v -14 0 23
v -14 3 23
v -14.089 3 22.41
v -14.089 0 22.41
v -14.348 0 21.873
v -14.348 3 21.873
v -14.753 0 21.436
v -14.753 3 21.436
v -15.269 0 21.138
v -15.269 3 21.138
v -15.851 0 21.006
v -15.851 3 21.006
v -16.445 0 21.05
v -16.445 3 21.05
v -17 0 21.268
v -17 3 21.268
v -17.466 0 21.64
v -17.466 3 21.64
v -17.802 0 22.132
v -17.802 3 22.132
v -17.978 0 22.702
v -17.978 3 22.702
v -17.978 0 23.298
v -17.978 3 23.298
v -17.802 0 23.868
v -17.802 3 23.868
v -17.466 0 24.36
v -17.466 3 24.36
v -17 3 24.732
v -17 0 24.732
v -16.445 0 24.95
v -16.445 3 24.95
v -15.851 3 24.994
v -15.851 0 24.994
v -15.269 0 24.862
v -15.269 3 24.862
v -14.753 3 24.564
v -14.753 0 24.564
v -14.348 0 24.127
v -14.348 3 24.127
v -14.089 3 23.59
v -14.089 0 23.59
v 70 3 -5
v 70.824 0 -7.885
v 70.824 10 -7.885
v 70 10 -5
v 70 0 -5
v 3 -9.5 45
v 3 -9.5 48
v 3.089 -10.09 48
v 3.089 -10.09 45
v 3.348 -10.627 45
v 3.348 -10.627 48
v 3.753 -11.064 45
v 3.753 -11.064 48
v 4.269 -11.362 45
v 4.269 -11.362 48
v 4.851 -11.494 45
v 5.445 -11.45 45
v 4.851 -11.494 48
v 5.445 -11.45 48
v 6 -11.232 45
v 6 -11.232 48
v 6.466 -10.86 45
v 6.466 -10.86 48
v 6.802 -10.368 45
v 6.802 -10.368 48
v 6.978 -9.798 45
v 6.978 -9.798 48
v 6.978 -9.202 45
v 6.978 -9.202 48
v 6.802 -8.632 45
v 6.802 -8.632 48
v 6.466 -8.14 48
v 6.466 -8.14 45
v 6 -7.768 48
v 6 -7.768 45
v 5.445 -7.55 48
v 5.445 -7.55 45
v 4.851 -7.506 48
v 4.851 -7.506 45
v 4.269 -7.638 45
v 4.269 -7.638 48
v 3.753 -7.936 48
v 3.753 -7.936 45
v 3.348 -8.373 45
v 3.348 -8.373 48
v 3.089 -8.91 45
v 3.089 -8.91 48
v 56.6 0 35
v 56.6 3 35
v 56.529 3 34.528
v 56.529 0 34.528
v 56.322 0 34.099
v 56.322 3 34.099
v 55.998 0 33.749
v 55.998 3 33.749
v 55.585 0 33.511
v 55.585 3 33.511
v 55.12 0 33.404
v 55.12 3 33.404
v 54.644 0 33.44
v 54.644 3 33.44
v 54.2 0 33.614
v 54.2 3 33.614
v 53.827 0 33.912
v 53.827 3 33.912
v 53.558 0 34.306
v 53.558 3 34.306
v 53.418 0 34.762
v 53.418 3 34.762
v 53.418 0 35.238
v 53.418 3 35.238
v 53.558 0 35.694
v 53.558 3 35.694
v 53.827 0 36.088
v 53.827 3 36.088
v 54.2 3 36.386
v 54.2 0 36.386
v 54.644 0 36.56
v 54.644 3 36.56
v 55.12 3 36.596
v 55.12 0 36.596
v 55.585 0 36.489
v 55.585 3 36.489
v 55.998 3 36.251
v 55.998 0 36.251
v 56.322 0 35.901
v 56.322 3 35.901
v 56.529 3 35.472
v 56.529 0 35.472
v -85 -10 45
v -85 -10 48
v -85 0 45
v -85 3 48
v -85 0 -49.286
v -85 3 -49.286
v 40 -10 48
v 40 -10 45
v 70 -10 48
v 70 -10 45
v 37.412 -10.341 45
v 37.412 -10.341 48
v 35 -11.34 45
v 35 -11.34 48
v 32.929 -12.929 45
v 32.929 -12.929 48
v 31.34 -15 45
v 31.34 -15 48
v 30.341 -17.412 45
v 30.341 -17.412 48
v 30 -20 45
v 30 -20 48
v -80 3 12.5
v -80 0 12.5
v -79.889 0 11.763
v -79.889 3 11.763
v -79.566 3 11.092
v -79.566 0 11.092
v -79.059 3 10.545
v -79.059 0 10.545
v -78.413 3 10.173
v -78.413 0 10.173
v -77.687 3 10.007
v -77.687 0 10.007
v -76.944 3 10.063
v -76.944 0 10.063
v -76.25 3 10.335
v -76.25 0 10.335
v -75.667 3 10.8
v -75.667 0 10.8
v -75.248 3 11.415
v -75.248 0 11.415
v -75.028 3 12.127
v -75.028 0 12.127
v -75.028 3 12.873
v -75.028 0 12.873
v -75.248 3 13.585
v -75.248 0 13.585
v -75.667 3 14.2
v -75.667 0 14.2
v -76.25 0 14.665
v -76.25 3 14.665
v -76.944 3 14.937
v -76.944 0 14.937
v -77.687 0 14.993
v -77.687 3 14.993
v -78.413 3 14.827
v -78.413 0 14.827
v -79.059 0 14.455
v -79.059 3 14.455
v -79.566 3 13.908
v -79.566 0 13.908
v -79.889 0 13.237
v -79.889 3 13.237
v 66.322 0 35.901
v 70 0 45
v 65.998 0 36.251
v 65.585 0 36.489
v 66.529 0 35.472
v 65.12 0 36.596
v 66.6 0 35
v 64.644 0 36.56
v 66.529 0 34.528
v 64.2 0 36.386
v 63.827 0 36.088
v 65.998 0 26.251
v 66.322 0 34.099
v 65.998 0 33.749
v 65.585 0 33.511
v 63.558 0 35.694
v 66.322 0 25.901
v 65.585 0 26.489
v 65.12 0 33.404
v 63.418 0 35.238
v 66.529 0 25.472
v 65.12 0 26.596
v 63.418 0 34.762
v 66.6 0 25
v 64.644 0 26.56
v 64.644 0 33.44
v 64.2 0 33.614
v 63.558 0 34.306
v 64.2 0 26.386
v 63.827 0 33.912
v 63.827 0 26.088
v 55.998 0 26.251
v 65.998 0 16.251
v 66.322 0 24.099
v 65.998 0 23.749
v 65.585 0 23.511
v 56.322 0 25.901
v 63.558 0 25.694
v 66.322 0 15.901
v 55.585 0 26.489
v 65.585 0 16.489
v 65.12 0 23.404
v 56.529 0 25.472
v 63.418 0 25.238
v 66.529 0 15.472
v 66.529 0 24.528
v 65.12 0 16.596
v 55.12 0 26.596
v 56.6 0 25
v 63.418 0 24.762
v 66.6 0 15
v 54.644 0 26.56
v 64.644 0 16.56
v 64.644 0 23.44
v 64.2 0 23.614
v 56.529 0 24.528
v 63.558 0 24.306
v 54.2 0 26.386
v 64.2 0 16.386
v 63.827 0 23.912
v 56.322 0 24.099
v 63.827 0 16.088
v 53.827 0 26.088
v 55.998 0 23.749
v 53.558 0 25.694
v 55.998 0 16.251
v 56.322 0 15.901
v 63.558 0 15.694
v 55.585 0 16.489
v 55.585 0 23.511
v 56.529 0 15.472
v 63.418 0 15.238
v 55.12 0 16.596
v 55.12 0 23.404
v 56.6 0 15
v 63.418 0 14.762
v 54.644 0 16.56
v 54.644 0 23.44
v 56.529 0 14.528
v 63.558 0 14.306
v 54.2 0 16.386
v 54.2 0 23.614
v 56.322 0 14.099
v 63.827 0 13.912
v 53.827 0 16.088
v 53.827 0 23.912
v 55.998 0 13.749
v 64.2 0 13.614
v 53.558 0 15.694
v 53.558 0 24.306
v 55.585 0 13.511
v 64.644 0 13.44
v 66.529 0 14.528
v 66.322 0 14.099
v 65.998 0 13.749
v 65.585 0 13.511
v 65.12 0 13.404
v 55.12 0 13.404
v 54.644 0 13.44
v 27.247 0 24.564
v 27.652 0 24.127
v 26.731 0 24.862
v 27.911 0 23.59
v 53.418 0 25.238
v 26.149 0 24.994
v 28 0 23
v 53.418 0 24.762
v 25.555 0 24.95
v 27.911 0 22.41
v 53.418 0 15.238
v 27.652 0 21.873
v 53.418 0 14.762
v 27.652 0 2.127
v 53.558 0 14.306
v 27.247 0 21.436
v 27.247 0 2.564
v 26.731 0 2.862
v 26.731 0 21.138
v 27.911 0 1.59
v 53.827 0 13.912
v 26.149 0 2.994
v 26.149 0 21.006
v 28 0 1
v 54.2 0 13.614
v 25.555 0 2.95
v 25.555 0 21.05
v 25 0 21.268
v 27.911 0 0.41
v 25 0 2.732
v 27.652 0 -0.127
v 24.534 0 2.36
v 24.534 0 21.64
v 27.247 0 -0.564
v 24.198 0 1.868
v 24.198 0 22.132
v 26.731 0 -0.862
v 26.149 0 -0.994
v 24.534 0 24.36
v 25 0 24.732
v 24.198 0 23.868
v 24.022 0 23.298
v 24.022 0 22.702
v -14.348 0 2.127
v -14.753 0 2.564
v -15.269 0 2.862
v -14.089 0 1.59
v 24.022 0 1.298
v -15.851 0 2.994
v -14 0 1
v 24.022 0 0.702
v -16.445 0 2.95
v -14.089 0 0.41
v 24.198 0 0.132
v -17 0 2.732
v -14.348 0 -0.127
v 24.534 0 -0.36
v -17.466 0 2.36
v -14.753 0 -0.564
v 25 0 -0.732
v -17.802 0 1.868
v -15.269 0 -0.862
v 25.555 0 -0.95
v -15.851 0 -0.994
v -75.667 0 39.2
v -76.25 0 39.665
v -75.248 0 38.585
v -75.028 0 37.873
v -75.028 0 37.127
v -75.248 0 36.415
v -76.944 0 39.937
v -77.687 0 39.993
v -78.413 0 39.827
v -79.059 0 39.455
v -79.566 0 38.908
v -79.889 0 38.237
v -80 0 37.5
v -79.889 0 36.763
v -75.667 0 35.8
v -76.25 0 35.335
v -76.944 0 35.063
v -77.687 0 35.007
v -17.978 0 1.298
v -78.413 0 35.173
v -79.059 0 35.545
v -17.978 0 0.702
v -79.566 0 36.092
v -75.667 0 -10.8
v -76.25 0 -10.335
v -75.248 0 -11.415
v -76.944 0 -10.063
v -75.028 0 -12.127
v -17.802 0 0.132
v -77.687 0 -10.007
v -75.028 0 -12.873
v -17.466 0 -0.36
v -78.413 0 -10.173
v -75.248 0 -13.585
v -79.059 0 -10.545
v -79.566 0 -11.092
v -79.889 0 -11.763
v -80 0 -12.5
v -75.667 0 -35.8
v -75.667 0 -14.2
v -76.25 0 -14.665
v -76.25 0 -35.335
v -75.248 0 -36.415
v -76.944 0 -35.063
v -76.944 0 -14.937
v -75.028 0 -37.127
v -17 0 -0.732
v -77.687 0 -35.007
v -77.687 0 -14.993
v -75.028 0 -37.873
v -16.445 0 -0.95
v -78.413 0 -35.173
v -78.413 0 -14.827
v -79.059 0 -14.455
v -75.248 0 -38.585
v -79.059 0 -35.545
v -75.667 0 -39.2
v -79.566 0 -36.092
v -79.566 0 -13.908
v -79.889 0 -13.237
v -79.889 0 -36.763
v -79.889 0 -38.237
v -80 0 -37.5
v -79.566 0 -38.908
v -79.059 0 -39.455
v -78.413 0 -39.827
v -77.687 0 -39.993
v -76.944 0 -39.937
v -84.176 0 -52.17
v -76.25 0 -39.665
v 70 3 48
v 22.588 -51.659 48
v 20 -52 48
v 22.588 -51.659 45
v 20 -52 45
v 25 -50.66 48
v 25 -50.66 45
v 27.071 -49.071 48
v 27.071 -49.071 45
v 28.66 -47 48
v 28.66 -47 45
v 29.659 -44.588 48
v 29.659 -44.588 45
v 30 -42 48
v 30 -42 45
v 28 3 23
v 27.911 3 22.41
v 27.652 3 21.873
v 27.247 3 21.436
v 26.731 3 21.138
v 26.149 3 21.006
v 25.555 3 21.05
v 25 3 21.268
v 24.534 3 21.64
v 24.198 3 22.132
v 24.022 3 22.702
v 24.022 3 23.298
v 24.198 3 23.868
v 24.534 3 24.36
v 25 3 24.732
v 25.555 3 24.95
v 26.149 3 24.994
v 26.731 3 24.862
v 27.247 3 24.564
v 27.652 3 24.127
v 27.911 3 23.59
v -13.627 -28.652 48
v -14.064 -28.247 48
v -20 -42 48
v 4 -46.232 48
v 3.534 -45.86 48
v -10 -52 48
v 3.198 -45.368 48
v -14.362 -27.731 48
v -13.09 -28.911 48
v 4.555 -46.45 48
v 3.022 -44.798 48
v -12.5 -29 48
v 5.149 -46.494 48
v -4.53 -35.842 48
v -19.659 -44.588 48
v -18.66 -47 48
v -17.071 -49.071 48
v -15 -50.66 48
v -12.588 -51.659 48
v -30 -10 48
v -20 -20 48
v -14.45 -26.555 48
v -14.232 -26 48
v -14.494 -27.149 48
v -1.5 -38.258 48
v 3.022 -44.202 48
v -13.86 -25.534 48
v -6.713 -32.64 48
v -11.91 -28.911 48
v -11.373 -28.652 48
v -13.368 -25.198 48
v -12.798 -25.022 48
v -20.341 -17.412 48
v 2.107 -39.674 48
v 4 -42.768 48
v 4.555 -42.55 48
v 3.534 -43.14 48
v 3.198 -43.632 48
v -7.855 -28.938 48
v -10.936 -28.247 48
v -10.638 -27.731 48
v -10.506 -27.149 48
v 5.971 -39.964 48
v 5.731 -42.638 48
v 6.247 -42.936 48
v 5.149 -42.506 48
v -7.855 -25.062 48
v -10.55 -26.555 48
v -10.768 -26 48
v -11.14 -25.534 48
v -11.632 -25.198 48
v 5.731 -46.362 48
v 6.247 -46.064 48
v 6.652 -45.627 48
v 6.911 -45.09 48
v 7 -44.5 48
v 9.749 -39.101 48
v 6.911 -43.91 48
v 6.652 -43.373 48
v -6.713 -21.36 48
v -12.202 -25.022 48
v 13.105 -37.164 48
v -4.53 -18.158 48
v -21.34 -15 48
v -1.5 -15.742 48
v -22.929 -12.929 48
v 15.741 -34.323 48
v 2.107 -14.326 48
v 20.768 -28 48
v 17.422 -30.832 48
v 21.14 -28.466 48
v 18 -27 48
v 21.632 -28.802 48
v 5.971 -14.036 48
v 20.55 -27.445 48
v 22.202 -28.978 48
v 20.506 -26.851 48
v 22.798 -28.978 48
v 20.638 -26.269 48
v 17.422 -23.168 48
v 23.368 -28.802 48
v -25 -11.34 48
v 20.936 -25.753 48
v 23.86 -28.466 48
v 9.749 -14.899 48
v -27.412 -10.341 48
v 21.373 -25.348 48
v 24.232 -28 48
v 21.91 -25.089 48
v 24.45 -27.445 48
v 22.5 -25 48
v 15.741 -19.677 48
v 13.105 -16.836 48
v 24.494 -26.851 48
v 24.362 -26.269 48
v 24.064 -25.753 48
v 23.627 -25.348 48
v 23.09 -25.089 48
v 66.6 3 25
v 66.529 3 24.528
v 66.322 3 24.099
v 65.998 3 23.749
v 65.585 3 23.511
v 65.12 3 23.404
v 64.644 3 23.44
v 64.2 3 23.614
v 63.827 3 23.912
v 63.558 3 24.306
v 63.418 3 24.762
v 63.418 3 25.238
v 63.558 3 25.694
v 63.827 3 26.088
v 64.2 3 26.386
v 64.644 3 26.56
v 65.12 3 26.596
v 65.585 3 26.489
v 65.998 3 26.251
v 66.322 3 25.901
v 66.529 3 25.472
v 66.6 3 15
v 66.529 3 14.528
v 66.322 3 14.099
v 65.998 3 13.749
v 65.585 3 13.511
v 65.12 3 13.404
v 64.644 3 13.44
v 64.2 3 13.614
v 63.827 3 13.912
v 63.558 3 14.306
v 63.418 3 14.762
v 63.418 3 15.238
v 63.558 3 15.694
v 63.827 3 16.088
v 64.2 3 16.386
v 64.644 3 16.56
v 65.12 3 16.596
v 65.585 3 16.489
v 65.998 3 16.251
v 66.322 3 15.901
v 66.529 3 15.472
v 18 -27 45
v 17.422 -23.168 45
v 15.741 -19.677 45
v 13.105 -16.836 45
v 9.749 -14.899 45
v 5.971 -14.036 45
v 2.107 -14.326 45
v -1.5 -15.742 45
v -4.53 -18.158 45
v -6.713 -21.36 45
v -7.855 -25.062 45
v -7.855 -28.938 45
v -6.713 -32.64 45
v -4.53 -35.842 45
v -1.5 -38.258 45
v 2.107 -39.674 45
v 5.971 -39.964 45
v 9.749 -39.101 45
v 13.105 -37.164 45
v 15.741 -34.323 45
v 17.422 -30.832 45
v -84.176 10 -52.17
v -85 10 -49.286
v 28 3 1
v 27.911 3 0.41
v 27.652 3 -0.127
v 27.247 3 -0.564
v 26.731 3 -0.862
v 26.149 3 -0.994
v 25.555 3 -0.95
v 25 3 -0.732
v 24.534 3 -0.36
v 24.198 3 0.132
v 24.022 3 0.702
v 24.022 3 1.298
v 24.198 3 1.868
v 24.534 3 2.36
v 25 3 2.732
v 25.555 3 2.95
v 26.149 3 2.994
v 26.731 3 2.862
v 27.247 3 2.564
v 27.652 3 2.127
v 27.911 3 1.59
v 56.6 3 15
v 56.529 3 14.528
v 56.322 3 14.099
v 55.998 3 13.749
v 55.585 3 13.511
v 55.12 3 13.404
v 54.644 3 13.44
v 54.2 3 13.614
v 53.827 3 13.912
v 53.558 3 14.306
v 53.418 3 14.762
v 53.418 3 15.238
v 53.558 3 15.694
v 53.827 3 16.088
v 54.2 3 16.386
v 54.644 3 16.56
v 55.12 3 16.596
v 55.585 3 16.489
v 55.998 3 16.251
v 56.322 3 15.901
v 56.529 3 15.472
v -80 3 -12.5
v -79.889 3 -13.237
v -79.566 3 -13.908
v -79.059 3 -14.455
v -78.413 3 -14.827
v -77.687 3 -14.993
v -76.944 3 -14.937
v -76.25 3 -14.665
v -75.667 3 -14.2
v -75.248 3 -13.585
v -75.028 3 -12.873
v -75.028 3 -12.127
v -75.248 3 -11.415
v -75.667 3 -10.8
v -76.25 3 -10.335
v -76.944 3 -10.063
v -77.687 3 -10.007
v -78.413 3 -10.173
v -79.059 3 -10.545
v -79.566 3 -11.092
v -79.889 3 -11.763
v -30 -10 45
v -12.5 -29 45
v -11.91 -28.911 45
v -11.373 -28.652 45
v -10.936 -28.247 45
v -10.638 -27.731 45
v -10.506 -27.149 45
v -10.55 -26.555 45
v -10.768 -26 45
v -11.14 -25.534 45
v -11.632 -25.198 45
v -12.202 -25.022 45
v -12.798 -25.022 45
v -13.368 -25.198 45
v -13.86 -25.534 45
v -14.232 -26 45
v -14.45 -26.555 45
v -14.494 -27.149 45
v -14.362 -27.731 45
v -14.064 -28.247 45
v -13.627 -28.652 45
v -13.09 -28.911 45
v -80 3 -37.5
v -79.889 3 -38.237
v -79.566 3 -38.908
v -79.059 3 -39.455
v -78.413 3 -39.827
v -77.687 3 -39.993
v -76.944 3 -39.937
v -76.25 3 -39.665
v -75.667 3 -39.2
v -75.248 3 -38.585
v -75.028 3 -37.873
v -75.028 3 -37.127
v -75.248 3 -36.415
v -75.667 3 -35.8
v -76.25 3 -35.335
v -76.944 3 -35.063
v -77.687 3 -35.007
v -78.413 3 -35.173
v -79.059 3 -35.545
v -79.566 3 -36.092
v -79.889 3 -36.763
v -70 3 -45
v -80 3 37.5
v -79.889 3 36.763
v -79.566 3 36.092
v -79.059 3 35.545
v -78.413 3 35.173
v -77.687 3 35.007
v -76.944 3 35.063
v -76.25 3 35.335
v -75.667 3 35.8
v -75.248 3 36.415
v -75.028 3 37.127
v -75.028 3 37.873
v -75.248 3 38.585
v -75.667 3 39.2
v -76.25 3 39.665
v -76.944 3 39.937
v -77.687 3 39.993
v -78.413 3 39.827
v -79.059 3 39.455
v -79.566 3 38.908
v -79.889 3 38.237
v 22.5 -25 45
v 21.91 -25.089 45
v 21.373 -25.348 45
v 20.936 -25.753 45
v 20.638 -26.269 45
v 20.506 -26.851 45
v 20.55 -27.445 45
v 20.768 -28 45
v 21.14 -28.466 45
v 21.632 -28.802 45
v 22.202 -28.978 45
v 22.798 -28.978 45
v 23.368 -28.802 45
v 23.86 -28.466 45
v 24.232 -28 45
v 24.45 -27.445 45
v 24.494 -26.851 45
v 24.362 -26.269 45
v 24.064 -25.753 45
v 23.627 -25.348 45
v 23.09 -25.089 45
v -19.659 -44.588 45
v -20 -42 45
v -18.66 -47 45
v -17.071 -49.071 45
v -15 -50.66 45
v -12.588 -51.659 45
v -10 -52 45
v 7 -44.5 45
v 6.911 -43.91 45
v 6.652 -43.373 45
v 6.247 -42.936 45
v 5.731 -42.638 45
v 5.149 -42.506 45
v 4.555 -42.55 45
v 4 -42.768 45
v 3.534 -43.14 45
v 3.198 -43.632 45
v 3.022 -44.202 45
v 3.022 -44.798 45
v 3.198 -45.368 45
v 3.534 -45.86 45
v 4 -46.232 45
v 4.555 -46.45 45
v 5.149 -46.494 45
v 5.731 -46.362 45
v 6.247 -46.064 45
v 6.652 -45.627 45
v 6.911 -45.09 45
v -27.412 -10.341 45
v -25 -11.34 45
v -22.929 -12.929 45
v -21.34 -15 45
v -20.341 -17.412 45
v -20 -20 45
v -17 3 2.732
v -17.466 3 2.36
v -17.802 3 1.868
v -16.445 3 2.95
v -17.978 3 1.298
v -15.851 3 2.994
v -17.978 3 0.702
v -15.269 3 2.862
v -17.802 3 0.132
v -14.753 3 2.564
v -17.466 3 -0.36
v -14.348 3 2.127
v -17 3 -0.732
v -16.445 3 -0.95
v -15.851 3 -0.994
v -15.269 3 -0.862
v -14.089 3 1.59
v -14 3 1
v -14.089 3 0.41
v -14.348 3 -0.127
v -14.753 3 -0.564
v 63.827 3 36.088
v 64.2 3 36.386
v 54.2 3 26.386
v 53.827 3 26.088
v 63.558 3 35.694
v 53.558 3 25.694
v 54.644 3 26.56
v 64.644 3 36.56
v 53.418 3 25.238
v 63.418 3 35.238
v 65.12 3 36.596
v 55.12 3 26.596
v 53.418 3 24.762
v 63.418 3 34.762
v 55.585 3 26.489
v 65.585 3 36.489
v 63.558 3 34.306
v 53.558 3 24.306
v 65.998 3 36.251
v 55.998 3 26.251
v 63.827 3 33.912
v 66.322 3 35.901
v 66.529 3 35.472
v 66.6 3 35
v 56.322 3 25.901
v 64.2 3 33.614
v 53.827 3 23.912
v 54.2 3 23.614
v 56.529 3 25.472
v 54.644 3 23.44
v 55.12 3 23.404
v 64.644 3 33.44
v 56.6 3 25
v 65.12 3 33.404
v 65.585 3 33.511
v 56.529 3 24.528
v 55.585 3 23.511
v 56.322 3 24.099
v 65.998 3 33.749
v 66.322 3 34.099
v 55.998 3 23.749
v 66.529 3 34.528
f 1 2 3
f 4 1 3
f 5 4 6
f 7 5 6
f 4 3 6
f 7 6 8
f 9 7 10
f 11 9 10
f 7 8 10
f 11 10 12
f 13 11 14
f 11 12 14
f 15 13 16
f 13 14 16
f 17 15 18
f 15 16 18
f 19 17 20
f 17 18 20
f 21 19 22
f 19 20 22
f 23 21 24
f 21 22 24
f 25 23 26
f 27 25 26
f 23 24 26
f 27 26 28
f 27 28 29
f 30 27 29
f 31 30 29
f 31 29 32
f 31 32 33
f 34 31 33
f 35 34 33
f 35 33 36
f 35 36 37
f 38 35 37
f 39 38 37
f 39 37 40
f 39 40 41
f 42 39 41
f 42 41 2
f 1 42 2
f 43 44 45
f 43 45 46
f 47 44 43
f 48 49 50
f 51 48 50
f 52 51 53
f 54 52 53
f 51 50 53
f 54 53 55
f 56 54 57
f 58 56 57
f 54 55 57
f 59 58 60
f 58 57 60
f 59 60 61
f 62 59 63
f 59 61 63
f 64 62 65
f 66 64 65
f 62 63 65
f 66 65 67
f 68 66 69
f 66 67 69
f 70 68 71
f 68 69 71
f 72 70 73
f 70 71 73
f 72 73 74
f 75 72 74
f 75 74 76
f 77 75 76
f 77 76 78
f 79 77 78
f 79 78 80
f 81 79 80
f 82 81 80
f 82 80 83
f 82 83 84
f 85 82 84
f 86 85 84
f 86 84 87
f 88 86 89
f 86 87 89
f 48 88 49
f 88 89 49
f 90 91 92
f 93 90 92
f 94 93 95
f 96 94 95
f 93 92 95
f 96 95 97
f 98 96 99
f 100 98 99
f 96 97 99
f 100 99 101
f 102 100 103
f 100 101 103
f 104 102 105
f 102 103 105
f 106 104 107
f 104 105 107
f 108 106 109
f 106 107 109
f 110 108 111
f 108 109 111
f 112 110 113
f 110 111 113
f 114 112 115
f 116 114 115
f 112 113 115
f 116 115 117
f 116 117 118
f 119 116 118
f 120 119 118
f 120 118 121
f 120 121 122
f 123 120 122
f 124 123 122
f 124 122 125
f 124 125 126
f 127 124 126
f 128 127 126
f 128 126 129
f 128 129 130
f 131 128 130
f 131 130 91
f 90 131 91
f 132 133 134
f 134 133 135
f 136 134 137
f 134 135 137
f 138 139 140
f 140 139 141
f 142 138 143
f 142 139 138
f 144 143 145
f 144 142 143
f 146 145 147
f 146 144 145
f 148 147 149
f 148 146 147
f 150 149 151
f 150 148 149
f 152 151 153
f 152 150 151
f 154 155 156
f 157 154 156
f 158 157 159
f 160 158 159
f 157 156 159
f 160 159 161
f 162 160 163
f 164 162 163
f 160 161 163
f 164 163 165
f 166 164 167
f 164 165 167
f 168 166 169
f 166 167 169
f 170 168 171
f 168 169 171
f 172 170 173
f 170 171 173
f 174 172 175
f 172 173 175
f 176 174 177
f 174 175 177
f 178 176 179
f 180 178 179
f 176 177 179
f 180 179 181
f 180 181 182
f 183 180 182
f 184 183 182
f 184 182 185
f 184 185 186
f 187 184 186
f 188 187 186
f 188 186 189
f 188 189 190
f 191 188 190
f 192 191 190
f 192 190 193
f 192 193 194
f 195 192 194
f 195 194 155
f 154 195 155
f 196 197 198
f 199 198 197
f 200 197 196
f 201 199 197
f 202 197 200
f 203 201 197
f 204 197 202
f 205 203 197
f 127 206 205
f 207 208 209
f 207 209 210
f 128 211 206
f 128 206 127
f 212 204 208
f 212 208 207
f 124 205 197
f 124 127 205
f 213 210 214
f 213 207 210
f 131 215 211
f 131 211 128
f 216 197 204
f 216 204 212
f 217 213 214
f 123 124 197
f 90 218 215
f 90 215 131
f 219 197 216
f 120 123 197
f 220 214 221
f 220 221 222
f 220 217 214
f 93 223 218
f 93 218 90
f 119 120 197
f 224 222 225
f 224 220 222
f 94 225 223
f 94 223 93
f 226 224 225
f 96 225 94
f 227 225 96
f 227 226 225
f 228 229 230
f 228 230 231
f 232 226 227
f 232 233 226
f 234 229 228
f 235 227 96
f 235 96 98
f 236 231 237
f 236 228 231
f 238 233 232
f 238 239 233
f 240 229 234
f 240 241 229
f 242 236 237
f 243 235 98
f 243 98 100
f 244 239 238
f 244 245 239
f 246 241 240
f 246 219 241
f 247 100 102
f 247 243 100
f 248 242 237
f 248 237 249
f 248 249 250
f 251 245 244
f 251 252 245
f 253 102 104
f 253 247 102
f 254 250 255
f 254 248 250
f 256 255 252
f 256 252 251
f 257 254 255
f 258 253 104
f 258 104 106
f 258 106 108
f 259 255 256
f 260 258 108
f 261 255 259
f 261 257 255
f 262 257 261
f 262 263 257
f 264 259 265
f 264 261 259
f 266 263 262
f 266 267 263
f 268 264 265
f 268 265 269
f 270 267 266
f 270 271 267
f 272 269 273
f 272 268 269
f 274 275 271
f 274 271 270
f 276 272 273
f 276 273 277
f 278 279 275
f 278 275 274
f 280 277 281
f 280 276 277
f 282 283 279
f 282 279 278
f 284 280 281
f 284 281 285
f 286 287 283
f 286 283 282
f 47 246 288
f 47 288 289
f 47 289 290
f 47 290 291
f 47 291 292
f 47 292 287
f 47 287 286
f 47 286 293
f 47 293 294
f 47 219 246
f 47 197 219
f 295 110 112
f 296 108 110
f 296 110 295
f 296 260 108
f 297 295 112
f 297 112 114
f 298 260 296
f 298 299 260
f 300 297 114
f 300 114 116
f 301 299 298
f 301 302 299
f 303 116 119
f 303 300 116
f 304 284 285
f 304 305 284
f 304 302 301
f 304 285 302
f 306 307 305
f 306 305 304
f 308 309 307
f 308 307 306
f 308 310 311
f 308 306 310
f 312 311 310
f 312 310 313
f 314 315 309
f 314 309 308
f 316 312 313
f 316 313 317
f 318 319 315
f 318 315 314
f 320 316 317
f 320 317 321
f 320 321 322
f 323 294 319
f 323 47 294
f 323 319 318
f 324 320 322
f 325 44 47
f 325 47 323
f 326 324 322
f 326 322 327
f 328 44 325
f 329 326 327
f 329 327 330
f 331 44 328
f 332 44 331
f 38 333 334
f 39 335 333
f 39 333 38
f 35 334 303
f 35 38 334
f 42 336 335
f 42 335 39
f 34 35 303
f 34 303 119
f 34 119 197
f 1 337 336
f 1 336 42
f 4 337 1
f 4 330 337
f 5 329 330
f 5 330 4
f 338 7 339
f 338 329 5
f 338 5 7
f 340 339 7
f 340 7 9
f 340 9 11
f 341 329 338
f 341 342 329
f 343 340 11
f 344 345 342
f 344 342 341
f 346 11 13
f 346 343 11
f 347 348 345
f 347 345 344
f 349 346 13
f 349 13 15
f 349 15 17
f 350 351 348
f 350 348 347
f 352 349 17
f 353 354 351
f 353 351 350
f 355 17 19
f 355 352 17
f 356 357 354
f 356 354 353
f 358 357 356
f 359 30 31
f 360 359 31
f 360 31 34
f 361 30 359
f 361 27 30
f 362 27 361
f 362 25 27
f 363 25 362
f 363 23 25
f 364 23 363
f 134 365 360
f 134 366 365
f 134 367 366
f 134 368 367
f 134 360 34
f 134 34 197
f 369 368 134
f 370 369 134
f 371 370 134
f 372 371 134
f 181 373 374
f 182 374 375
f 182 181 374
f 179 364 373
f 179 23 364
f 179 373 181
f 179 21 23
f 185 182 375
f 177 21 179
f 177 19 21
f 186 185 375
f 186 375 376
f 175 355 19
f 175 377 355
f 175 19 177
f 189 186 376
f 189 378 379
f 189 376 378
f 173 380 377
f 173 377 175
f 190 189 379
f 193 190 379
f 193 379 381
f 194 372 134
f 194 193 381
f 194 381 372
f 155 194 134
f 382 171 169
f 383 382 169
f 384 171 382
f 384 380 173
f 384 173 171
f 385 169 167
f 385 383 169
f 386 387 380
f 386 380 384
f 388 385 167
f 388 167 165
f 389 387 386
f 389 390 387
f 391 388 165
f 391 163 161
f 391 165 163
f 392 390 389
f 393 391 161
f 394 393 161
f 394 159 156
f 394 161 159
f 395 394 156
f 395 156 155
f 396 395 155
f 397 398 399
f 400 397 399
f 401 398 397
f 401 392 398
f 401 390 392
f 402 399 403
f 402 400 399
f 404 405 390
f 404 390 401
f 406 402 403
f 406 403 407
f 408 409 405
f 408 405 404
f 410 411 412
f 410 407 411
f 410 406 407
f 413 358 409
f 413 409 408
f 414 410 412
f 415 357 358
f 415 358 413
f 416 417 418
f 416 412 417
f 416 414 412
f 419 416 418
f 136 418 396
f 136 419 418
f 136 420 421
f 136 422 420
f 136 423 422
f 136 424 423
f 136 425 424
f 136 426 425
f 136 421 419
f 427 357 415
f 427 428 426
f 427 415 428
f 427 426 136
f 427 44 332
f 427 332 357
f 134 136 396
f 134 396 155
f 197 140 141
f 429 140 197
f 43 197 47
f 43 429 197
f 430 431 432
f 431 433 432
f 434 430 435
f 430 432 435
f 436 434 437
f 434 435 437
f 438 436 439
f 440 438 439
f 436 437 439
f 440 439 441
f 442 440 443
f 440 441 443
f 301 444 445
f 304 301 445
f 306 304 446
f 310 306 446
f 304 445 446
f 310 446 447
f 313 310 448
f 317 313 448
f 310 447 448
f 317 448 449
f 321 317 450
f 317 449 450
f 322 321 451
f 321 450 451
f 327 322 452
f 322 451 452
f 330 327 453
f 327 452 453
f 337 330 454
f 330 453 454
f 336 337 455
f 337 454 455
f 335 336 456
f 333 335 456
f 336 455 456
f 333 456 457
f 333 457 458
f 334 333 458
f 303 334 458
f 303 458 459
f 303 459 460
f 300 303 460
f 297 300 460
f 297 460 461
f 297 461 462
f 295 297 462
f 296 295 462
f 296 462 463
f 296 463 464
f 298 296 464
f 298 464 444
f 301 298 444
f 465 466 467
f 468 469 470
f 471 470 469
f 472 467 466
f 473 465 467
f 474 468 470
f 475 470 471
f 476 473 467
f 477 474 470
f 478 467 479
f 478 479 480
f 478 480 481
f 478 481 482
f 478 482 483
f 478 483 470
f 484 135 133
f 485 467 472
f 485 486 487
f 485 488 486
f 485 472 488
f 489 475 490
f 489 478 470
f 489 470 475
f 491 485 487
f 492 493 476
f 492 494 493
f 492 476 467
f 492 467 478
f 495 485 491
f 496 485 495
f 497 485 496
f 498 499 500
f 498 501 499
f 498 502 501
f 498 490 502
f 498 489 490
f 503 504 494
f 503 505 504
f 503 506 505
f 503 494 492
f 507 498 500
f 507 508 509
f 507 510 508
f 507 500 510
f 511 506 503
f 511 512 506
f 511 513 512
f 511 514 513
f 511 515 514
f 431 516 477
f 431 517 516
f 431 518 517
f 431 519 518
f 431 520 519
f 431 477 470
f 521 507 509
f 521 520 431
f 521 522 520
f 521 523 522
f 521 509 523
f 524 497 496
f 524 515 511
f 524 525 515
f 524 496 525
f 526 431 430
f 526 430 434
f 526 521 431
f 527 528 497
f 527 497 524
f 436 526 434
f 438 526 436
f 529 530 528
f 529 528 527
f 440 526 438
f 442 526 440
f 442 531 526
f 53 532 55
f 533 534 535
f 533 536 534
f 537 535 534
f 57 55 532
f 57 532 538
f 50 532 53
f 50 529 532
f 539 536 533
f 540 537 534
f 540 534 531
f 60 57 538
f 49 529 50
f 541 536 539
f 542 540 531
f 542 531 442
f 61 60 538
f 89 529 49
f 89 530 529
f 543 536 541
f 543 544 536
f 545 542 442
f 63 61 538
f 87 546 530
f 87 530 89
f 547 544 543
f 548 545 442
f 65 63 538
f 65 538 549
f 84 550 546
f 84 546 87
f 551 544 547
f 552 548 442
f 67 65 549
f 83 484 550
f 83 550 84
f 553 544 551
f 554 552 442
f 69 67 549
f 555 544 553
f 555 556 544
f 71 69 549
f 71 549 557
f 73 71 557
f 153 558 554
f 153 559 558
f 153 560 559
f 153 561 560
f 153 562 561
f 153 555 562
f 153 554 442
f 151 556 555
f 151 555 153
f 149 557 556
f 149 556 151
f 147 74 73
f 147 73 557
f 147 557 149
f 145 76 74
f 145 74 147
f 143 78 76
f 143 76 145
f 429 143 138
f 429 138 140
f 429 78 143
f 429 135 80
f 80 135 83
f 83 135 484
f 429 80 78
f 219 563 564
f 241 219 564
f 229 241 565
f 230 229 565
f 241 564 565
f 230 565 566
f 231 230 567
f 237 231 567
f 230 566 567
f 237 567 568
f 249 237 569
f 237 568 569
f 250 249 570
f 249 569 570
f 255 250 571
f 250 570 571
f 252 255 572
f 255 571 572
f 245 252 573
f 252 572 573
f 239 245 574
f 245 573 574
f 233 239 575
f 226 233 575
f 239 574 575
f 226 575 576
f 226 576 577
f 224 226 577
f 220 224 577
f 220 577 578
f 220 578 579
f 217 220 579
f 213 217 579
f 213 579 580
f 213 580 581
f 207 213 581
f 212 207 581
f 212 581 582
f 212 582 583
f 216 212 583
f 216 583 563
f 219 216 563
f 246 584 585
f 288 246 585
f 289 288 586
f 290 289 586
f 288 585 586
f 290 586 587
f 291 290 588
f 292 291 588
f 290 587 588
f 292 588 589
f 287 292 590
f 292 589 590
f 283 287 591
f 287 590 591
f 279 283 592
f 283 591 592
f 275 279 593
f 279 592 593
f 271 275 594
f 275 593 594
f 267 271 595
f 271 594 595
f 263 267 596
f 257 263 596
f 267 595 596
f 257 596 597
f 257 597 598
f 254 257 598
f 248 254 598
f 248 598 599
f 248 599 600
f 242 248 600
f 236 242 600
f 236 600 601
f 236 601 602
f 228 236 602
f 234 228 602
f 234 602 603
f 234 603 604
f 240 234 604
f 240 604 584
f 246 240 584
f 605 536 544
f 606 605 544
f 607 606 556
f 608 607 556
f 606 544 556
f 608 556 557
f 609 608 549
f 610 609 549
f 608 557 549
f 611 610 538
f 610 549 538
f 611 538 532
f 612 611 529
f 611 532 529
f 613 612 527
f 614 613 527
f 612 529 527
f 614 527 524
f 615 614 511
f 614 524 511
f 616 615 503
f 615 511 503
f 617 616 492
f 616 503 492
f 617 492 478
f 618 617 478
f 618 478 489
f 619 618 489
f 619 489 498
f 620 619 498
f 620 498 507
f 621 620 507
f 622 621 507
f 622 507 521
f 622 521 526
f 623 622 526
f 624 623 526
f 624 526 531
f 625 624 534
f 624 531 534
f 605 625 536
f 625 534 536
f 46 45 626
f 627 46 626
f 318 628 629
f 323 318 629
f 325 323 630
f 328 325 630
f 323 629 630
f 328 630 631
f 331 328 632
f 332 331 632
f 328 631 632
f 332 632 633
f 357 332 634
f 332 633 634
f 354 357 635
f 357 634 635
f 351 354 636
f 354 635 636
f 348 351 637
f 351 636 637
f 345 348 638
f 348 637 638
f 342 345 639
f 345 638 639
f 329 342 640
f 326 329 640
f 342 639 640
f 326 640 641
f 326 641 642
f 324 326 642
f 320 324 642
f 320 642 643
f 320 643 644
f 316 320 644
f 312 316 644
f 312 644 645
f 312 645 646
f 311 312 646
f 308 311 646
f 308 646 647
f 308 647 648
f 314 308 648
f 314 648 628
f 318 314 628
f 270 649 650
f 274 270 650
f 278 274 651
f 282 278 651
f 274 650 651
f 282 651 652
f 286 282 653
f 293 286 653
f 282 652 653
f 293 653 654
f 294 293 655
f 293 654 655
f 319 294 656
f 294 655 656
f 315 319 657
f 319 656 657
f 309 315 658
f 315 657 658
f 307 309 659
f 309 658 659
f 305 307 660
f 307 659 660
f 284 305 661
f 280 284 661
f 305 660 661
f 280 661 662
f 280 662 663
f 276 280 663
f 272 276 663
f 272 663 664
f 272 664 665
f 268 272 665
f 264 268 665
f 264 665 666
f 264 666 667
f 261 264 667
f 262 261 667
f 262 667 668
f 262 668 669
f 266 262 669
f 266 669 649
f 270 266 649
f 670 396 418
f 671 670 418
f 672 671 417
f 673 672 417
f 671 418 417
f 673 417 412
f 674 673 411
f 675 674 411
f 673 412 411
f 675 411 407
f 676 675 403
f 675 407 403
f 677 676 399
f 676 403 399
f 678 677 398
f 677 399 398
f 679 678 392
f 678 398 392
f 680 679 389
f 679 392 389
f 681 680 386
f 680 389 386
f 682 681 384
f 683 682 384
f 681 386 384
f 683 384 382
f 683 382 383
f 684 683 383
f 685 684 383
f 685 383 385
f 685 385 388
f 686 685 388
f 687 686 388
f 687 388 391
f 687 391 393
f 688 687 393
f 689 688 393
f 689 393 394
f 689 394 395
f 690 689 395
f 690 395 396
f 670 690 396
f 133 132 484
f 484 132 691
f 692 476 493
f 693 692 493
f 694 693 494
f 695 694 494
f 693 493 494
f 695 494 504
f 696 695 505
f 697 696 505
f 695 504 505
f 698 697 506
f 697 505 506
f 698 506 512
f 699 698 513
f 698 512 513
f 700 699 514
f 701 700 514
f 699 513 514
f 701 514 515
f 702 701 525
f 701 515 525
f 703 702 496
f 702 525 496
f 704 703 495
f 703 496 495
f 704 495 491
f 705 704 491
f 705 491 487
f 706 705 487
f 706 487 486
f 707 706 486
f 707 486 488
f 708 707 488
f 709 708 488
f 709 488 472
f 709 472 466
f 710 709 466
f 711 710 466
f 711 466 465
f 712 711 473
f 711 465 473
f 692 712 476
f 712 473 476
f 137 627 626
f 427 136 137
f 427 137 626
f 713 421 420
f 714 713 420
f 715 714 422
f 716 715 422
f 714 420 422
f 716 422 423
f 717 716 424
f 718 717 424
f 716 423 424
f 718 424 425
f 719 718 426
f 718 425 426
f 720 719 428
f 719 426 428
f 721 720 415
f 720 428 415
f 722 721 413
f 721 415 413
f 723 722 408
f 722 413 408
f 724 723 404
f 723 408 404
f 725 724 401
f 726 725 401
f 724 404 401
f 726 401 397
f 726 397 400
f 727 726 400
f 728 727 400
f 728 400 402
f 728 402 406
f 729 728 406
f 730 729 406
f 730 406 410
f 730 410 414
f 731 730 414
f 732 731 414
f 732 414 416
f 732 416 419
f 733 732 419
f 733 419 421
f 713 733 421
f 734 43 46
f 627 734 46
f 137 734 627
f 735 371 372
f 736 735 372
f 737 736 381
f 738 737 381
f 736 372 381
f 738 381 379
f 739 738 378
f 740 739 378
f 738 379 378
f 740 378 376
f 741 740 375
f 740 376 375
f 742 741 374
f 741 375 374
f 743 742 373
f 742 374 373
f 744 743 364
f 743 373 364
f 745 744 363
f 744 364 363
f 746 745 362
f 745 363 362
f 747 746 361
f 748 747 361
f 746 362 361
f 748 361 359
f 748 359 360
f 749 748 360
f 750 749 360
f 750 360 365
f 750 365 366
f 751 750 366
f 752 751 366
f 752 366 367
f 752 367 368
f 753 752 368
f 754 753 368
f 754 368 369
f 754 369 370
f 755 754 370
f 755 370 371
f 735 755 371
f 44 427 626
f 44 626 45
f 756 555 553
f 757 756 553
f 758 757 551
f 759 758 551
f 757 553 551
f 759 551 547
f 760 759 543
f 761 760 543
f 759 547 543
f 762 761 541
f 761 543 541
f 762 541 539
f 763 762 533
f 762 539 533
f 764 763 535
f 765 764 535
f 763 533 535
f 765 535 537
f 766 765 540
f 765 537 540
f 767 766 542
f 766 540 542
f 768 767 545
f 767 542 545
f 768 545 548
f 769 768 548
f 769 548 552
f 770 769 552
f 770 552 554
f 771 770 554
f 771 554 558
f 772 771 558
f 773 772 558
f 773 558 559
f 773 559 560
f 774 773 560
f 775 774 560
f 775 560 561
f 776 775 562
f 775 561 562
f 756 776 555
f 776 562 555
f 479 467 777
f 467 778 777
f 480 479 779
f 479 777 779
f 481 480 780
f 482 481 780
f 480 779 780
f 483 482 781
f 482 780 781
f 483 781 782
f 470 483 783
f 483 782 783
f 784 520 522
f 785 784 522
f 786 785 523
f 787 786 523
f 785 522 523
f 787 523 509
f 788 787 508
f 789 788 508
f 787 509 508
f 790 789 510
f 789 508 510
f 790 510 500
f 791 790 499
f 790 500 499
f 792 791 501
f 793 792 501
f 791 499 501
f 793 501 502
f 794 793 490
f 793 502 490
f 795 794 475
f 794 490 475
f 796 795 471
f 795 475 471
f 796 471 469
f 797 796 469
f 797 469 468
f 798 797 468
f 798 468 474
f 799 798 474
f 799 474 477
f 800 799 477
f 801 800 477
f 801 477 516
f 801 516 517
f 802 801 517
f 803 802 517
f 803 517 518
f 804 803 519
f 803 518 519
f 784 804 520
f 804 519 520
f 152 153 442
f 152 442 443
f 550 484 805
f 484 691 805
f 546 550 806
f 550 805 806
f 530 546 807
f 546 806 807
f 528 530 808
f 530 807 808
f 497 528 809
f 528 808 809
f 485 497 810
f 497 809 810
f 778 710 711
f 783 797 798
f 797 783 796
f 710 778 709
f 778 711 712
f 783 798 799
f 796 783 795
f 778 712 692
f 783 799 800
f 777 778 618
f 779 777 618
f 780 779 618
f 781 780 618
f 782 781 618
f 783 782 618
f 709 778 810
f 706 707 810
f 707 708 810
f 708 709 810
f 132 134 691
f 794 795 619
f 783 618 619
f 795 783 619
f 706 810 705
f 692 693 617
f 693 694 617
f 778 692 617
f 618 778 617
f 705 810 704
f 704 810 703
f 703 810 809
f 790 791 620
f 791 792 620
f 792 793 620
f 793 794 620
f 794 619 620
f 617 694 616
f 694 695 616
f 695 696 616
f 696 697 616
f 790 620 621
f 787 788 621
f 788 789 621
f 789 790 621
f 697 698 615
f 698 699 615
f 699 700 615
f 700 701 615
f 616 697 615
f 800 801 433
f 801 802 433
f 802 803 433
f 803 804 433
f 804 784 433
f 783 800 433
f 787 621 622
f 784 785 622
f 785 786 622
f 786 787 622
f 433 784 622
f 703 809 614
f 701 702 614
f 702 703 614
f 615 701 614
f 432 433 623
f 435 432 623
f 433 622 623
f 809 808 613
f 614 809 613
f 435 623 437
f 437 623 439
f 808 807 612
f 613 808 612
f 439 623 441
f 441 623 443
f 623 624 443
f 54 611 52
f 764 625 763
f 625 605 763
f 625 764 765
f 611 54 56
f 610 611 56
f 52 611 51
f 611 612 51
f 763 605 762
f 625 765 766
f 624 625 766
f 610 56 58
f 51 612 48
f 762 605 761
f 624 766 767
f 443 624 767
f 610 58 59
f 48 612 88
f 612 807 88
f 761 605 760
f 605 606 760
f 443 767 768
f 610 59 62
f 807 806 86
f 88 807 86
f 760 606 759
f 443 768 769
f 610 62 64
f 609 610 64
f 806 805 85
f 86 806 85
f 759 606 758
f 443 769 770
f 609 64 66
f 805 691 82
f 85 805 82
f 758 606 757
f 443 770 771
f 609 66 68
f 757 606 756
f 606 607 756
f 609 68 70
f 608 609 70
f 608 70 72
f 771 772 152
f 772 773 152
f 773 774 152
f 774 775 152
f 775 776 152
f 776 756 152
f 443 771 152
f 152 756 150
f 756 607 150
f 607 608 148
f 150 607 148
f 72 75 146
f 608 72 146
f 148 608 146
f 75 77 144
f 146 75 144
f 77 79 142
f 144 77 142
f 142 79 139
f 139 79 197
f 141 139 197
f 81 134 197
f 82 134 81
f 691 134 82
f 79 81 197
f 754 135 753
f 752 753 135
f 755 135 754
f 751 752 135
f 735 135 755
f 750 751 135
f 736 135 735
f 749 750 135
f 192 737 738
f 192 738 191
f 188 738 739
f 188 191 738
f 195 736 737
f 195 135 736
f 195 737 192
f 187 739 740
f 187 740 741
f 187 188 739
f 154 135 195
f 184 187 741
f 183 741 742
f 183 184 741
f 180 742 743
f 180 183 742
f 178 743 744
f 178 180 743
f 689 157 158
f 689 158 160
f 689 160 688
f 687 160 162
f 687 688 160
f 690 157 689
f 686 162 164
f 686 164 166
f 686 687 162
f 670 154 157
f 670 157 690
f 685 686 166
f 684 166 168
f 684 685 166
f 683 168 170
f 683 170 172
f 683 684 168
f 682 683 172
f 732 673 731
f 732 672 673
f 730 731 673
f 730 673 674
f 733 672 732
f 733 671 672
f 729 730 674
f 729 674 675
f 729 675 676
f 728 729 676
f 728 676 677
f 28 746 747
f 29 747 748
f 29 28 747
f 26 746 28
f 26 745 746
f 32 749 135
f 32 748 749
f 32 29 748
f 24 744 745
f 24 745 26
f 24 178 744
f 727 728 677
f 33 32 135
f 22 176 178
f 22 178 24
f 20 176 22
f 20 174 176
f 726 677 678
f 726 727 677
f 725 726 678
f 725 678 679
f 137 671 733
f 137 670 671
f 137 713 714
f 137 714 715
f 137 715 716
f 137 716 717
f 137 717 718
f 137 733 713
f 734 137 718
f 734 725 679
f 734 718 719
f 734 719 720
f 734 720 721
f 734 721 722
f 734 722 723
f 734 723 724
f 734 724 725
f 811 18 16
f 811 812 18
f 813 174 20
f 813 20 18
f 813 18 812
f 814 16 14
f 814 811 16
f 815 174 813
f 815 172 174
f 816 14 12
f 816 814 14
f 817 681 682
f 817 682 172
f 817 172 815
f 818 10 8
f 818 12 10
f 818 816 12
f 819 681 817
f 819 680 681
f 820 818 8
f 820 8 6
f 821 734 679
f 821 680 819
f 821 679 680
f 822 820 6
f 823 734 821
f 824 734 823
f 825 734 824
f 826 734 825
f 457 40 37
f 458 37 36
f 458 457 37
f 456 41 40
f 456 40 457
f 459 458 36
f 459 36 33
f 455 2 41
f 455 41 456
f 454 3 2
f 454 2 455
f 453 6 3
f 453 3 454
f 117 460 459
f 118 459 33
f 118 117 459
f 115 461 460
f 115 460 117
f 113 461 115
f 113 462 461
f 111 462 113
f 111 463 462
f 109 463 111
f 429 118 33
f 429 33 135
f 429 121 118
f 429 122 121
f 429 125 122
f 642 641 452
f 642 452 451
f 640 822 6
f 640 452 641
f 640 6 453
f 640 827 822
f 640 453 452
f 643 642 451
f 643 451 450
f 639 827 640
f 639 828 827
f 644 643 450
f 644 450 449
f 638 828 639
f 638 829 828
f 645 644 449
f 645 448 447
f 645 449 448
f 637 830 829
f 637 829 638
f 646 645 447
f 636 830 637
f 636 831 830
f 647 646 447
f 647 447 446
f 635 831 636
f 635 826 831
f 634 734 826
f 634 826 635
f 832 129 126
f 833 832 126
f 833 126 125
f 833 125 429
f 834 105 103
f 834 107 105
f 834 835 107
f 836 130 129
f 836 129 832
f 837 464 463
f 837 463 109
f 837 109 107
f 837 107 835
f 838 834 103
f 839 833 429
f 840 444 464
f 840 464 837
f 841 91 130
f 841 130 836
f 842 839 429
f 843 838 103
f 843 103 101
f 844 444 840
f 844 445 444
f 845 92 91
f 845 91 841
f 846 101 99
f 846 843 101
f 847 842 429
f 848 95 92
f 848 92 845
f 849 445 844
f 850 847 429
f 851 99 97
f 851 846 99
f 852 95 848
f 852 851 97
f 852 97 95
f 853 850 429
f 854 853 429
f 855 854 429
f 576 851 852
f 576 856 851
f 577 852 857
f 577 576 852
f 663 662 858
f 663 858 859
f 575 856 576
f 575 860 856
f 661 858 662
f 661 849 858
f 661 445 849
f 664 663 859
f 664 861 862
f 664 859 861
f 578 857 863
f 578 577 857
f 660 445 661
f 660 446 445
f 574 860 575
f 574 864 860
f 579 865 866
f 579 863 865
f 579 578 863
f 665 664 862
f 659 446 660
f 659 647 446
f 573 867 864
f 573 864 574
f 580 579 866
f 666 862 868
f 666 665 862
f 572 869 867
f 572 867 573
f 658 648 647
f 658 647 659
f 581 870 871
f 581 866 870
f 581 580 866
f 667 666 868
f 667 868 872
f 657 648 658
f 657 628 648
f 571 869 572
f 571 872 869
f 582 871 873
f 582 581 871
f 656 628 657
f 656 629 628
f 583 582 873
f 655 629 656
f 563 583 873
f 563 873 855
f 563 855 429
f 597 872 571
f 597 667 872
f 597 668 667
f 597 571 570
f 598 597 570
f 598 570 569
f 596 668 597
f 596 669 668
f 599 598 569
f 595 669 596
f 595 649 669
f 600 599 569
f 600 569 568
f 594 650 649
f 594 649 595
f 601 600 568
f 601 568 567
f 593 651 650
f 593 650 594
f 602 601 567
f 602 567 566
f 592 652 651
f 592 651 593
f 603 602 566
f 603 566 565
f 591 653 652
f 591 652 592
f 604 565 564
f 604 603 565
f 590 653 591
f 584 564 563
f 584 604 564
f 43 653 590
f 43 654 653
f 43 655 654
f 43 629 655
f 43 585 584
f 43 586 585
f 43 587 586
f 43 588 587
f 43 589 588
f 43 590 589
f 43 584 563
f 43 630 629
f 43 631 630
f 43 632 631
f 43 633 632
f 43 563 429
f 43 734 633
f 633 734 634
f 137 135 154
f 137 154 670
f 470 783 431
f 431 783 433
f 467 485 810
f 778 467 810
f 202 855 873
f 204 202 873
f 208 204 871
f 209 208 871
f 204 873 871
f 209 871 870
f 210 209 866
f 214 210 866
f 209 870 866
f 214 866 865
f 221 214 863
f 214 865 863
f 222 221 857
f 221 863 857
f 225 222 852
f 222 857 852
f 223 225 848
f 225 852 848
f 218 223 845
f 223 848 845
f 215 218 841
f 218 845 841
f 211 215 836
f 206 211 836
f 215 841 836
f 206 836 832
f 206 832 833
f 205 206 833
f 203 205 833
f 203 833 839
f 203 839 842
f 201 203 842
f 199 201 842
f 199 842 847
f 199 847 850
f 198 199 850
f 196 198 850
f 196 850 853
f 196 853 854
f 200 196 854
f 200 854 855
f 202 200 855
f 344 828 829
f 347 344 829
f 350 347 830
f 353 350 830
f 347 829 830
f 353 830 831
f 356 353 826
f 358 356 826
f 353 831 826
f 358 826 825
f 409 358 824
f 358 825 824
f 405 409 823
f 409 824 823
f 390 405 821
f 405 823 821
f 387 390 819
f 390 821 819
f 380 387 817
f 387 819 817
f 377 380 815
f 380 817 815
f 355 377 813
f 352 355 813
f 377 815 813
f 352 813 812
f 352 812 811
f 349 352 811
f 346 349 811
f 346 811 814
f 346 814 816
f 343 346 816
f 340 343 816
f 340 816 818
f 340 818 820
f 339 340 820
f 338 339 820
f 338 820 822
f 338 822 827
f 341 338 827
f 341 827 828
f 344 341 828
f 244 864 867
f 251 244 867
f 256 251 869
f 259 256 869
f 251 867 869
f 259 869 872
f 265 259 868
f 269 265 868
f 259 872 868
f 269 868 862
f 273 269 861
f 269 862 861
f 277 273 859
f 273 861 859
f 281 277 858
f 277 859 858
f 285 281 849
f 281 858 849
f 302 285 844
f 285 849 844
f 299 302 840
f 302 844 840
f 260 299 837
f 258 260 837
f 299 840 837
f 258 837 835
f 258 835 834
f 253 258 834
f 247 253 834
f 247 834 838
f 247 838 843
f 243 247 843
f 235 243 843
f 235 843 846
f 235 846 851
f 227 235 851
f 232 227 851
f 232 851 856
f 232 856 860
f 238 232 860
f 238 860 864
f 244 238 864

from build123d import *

# Parameters (mm, degrees)
EXTRUDE_1_DEPTH             = 3
HOLE_WIZARD_5_0_5_2_D       = 5
HOLE_WIZARD_3_2_3_2_2_D     = 3.2
PATTERN_LINEAR_1_COUNT      = 3
PATTERN_LINEAR_1_PITCH      = 10
PATTERN_LINEAR_1_COUNT_DIR2 = 2
PATTERN_LINEAR_1_PITCH_DIR2 = 10
SKETCH_8_W                  = 155
SKETCH_8_H                  = 3
EXTRUDE_2_DEPTH             = 13
SKETCH_10_W                 = 50
SKETCH_10_H                 = 3
EXTRUDE_3_DEPTH             = 55
EXTRUDE_5_DEPTH             = 10
SKETCH_12_R                 = 13
CUT_EXTRUDE_1_DEPTH         = 3
SKETCH_13_R                 = 2
CUT_EXTRUDE_2_DEPTH         = 3
PATTERN_CIRCULAR_1_COUNT    = 4
FILLET_1_R                  = 10
HOLE_WIZARD_4_0_4_1_D       = 4


with BuildPart() as part:
    # 草图1 → 凸台-拉伸1 (new body)
    with BuildSketch(Plane(origin=(0, 0, 0), x_dir=(1, 0, 0), z_dir=(0, 1, 0))):
        Polygon((-85, -45), (70, -45), (70, 5), (-70, 45), (-85, 45), align=None)
        Polygon((-85, 45), (-70, 45), (-85, 49.285714286), align=None)
    extrude(amount=EXTRUDE_1_DEPTH)

    # Ø5.0 (5) 直径孔2 (through all)
    with Locations(Plane(origin=(0, 3, 0), x_dir=(1, 0, 0), z_dir=(0, 1, 0))):
        with Locations((-77.5, -37.5), (-77.5, -12.5), (-77.5, 37.5), (-77.5, 12.5)):
            Hole(HOLE_WIZARD_5_0_5_2_D / 2)

    # Ø3.2 (3.2) 直径孔2 (through all)
    with Locations(Plane(origin=(0, 0, 0), x_dir=(-1, 0, 0), z_dir=(0, -1, 0))):
        with Locations((-65, -35)):
            hole_wizard_3_2_3_2_2 = Hole(HOLE_WIZARD_3_2_3_2_2_D / 2)

    # 阵列(线性)1: Hole Wizard 3.2 _3.2_ _2 3 × 2
    with Locations(*[(-j * PATTERN_LINEAR_1_PITCH_DIR2, 0, -i * PATTERN_LINEAR_1_PITCH) for i in range(PATTERN_LINEAR_1_COUNT) for j in range(PATTERN_LINEAR_1_COUNT_DIR2) if (i, j) != (0, 0)]):
        add(hole_wizard_3_2_3_2_2, mode=Mode.SUBTRACT)

    # 草图8 → 凸台-拉伸2 (add)
    with BuildSketch(Plane(origin=(0, 3, 0), x_dir=(1, 0, 0), z_dir=(0, 1, 0))):
        with Locations((-7.5, -46.5)):
            Rectangle(SKETCH_8_W, SKETCH_8_H)
    extrude(amount=-EXTRUDE_2_DEPTH)

    # 草图10 → 凸台-拉伸3 (add)
    with BuildSketch(Plane(origin=(0, 3, 0), x_dir=(1, 0, 0), z_dir=(0, 1, 0))):
        with Locations((5, -46.5)):
            Rectangle(SKETCH_10_W, SKETCH_10_H)
    extrude(amount=-EXTRUDE_3_DEPTH)

    # 草图11 → 凸台-拉伸5 (add)
    with BuildSketch(Plane(origin=(0, 0, 0), x_dir=(1, 0, 0), z_dir=(0, 1, 0))):
        Polygon((-85, 49.285714286), (-84.175836616, 52.170286129), (70.824163384, 7.884571843), (70, 5), align=None)
    extrude(amount=EXTRUDE_5_DEPTH)

    # 草图12 → 切除-拉伸1 (cut)
    with BuildSketch(Plane.XY.offset(48)):
        with Locations((5, -27)):
            Circle(SKETCH_12_R)
    extrude(amount=-CUT_EXTRUDE_1_DEPTH, mode=Mode.SUBTRACT)

    # 草图13 → 切除-拉伸2 (cut)
    with BuildSketch(Plane.XY.offset(48)):
        with Locations((5, -44.5)):
            Circle(SKETCH_13_R)
    cut_extrude_2 = extrude(amount=-CUT_EXTRUDE_2_DEPTH, mode=Mode.SUBTRACT)

    # 阵列(圆周)1: 切除-拉伸2 ×4 about axis
    pattern_circular_1_axis = Axis((5, -27, 0), (0, 0, 1))
    for i in range(1, PATTERN_CIRCULAR_1_COUNT):
        add(cut_extrude_2.rotate(pattern_circular_1_axis, i * 360 / PATTERN_CIRCULAR_1_COUNT), mode=Mode.SUBTRACT)

    # 圆角1
    fillet_1_edges = [part.edges().sort_by_distance(p)[0] for p in [
        (-20, -10, 46.5),
        (30, -10, 46.5),
        (30, -52, 46.5),
        (-20, -52, 46.5),
    ]]
    fillet(fillet_1_edges, radius=FILLET_1_R)

    # Ø4.0 (4) 直径孔1 (through all)
    with Locations(Plane(origin=(0, 0, 0), x_dir=(-1, 0, 0), z_dir=(0, -1, 0))):
        with Locations((16, -1), (-26, -23), (16, -23), (-26, -1)):
            Hole(HOLE_WIZARD_4_0_4_1_D / 2)


solid = part.part
